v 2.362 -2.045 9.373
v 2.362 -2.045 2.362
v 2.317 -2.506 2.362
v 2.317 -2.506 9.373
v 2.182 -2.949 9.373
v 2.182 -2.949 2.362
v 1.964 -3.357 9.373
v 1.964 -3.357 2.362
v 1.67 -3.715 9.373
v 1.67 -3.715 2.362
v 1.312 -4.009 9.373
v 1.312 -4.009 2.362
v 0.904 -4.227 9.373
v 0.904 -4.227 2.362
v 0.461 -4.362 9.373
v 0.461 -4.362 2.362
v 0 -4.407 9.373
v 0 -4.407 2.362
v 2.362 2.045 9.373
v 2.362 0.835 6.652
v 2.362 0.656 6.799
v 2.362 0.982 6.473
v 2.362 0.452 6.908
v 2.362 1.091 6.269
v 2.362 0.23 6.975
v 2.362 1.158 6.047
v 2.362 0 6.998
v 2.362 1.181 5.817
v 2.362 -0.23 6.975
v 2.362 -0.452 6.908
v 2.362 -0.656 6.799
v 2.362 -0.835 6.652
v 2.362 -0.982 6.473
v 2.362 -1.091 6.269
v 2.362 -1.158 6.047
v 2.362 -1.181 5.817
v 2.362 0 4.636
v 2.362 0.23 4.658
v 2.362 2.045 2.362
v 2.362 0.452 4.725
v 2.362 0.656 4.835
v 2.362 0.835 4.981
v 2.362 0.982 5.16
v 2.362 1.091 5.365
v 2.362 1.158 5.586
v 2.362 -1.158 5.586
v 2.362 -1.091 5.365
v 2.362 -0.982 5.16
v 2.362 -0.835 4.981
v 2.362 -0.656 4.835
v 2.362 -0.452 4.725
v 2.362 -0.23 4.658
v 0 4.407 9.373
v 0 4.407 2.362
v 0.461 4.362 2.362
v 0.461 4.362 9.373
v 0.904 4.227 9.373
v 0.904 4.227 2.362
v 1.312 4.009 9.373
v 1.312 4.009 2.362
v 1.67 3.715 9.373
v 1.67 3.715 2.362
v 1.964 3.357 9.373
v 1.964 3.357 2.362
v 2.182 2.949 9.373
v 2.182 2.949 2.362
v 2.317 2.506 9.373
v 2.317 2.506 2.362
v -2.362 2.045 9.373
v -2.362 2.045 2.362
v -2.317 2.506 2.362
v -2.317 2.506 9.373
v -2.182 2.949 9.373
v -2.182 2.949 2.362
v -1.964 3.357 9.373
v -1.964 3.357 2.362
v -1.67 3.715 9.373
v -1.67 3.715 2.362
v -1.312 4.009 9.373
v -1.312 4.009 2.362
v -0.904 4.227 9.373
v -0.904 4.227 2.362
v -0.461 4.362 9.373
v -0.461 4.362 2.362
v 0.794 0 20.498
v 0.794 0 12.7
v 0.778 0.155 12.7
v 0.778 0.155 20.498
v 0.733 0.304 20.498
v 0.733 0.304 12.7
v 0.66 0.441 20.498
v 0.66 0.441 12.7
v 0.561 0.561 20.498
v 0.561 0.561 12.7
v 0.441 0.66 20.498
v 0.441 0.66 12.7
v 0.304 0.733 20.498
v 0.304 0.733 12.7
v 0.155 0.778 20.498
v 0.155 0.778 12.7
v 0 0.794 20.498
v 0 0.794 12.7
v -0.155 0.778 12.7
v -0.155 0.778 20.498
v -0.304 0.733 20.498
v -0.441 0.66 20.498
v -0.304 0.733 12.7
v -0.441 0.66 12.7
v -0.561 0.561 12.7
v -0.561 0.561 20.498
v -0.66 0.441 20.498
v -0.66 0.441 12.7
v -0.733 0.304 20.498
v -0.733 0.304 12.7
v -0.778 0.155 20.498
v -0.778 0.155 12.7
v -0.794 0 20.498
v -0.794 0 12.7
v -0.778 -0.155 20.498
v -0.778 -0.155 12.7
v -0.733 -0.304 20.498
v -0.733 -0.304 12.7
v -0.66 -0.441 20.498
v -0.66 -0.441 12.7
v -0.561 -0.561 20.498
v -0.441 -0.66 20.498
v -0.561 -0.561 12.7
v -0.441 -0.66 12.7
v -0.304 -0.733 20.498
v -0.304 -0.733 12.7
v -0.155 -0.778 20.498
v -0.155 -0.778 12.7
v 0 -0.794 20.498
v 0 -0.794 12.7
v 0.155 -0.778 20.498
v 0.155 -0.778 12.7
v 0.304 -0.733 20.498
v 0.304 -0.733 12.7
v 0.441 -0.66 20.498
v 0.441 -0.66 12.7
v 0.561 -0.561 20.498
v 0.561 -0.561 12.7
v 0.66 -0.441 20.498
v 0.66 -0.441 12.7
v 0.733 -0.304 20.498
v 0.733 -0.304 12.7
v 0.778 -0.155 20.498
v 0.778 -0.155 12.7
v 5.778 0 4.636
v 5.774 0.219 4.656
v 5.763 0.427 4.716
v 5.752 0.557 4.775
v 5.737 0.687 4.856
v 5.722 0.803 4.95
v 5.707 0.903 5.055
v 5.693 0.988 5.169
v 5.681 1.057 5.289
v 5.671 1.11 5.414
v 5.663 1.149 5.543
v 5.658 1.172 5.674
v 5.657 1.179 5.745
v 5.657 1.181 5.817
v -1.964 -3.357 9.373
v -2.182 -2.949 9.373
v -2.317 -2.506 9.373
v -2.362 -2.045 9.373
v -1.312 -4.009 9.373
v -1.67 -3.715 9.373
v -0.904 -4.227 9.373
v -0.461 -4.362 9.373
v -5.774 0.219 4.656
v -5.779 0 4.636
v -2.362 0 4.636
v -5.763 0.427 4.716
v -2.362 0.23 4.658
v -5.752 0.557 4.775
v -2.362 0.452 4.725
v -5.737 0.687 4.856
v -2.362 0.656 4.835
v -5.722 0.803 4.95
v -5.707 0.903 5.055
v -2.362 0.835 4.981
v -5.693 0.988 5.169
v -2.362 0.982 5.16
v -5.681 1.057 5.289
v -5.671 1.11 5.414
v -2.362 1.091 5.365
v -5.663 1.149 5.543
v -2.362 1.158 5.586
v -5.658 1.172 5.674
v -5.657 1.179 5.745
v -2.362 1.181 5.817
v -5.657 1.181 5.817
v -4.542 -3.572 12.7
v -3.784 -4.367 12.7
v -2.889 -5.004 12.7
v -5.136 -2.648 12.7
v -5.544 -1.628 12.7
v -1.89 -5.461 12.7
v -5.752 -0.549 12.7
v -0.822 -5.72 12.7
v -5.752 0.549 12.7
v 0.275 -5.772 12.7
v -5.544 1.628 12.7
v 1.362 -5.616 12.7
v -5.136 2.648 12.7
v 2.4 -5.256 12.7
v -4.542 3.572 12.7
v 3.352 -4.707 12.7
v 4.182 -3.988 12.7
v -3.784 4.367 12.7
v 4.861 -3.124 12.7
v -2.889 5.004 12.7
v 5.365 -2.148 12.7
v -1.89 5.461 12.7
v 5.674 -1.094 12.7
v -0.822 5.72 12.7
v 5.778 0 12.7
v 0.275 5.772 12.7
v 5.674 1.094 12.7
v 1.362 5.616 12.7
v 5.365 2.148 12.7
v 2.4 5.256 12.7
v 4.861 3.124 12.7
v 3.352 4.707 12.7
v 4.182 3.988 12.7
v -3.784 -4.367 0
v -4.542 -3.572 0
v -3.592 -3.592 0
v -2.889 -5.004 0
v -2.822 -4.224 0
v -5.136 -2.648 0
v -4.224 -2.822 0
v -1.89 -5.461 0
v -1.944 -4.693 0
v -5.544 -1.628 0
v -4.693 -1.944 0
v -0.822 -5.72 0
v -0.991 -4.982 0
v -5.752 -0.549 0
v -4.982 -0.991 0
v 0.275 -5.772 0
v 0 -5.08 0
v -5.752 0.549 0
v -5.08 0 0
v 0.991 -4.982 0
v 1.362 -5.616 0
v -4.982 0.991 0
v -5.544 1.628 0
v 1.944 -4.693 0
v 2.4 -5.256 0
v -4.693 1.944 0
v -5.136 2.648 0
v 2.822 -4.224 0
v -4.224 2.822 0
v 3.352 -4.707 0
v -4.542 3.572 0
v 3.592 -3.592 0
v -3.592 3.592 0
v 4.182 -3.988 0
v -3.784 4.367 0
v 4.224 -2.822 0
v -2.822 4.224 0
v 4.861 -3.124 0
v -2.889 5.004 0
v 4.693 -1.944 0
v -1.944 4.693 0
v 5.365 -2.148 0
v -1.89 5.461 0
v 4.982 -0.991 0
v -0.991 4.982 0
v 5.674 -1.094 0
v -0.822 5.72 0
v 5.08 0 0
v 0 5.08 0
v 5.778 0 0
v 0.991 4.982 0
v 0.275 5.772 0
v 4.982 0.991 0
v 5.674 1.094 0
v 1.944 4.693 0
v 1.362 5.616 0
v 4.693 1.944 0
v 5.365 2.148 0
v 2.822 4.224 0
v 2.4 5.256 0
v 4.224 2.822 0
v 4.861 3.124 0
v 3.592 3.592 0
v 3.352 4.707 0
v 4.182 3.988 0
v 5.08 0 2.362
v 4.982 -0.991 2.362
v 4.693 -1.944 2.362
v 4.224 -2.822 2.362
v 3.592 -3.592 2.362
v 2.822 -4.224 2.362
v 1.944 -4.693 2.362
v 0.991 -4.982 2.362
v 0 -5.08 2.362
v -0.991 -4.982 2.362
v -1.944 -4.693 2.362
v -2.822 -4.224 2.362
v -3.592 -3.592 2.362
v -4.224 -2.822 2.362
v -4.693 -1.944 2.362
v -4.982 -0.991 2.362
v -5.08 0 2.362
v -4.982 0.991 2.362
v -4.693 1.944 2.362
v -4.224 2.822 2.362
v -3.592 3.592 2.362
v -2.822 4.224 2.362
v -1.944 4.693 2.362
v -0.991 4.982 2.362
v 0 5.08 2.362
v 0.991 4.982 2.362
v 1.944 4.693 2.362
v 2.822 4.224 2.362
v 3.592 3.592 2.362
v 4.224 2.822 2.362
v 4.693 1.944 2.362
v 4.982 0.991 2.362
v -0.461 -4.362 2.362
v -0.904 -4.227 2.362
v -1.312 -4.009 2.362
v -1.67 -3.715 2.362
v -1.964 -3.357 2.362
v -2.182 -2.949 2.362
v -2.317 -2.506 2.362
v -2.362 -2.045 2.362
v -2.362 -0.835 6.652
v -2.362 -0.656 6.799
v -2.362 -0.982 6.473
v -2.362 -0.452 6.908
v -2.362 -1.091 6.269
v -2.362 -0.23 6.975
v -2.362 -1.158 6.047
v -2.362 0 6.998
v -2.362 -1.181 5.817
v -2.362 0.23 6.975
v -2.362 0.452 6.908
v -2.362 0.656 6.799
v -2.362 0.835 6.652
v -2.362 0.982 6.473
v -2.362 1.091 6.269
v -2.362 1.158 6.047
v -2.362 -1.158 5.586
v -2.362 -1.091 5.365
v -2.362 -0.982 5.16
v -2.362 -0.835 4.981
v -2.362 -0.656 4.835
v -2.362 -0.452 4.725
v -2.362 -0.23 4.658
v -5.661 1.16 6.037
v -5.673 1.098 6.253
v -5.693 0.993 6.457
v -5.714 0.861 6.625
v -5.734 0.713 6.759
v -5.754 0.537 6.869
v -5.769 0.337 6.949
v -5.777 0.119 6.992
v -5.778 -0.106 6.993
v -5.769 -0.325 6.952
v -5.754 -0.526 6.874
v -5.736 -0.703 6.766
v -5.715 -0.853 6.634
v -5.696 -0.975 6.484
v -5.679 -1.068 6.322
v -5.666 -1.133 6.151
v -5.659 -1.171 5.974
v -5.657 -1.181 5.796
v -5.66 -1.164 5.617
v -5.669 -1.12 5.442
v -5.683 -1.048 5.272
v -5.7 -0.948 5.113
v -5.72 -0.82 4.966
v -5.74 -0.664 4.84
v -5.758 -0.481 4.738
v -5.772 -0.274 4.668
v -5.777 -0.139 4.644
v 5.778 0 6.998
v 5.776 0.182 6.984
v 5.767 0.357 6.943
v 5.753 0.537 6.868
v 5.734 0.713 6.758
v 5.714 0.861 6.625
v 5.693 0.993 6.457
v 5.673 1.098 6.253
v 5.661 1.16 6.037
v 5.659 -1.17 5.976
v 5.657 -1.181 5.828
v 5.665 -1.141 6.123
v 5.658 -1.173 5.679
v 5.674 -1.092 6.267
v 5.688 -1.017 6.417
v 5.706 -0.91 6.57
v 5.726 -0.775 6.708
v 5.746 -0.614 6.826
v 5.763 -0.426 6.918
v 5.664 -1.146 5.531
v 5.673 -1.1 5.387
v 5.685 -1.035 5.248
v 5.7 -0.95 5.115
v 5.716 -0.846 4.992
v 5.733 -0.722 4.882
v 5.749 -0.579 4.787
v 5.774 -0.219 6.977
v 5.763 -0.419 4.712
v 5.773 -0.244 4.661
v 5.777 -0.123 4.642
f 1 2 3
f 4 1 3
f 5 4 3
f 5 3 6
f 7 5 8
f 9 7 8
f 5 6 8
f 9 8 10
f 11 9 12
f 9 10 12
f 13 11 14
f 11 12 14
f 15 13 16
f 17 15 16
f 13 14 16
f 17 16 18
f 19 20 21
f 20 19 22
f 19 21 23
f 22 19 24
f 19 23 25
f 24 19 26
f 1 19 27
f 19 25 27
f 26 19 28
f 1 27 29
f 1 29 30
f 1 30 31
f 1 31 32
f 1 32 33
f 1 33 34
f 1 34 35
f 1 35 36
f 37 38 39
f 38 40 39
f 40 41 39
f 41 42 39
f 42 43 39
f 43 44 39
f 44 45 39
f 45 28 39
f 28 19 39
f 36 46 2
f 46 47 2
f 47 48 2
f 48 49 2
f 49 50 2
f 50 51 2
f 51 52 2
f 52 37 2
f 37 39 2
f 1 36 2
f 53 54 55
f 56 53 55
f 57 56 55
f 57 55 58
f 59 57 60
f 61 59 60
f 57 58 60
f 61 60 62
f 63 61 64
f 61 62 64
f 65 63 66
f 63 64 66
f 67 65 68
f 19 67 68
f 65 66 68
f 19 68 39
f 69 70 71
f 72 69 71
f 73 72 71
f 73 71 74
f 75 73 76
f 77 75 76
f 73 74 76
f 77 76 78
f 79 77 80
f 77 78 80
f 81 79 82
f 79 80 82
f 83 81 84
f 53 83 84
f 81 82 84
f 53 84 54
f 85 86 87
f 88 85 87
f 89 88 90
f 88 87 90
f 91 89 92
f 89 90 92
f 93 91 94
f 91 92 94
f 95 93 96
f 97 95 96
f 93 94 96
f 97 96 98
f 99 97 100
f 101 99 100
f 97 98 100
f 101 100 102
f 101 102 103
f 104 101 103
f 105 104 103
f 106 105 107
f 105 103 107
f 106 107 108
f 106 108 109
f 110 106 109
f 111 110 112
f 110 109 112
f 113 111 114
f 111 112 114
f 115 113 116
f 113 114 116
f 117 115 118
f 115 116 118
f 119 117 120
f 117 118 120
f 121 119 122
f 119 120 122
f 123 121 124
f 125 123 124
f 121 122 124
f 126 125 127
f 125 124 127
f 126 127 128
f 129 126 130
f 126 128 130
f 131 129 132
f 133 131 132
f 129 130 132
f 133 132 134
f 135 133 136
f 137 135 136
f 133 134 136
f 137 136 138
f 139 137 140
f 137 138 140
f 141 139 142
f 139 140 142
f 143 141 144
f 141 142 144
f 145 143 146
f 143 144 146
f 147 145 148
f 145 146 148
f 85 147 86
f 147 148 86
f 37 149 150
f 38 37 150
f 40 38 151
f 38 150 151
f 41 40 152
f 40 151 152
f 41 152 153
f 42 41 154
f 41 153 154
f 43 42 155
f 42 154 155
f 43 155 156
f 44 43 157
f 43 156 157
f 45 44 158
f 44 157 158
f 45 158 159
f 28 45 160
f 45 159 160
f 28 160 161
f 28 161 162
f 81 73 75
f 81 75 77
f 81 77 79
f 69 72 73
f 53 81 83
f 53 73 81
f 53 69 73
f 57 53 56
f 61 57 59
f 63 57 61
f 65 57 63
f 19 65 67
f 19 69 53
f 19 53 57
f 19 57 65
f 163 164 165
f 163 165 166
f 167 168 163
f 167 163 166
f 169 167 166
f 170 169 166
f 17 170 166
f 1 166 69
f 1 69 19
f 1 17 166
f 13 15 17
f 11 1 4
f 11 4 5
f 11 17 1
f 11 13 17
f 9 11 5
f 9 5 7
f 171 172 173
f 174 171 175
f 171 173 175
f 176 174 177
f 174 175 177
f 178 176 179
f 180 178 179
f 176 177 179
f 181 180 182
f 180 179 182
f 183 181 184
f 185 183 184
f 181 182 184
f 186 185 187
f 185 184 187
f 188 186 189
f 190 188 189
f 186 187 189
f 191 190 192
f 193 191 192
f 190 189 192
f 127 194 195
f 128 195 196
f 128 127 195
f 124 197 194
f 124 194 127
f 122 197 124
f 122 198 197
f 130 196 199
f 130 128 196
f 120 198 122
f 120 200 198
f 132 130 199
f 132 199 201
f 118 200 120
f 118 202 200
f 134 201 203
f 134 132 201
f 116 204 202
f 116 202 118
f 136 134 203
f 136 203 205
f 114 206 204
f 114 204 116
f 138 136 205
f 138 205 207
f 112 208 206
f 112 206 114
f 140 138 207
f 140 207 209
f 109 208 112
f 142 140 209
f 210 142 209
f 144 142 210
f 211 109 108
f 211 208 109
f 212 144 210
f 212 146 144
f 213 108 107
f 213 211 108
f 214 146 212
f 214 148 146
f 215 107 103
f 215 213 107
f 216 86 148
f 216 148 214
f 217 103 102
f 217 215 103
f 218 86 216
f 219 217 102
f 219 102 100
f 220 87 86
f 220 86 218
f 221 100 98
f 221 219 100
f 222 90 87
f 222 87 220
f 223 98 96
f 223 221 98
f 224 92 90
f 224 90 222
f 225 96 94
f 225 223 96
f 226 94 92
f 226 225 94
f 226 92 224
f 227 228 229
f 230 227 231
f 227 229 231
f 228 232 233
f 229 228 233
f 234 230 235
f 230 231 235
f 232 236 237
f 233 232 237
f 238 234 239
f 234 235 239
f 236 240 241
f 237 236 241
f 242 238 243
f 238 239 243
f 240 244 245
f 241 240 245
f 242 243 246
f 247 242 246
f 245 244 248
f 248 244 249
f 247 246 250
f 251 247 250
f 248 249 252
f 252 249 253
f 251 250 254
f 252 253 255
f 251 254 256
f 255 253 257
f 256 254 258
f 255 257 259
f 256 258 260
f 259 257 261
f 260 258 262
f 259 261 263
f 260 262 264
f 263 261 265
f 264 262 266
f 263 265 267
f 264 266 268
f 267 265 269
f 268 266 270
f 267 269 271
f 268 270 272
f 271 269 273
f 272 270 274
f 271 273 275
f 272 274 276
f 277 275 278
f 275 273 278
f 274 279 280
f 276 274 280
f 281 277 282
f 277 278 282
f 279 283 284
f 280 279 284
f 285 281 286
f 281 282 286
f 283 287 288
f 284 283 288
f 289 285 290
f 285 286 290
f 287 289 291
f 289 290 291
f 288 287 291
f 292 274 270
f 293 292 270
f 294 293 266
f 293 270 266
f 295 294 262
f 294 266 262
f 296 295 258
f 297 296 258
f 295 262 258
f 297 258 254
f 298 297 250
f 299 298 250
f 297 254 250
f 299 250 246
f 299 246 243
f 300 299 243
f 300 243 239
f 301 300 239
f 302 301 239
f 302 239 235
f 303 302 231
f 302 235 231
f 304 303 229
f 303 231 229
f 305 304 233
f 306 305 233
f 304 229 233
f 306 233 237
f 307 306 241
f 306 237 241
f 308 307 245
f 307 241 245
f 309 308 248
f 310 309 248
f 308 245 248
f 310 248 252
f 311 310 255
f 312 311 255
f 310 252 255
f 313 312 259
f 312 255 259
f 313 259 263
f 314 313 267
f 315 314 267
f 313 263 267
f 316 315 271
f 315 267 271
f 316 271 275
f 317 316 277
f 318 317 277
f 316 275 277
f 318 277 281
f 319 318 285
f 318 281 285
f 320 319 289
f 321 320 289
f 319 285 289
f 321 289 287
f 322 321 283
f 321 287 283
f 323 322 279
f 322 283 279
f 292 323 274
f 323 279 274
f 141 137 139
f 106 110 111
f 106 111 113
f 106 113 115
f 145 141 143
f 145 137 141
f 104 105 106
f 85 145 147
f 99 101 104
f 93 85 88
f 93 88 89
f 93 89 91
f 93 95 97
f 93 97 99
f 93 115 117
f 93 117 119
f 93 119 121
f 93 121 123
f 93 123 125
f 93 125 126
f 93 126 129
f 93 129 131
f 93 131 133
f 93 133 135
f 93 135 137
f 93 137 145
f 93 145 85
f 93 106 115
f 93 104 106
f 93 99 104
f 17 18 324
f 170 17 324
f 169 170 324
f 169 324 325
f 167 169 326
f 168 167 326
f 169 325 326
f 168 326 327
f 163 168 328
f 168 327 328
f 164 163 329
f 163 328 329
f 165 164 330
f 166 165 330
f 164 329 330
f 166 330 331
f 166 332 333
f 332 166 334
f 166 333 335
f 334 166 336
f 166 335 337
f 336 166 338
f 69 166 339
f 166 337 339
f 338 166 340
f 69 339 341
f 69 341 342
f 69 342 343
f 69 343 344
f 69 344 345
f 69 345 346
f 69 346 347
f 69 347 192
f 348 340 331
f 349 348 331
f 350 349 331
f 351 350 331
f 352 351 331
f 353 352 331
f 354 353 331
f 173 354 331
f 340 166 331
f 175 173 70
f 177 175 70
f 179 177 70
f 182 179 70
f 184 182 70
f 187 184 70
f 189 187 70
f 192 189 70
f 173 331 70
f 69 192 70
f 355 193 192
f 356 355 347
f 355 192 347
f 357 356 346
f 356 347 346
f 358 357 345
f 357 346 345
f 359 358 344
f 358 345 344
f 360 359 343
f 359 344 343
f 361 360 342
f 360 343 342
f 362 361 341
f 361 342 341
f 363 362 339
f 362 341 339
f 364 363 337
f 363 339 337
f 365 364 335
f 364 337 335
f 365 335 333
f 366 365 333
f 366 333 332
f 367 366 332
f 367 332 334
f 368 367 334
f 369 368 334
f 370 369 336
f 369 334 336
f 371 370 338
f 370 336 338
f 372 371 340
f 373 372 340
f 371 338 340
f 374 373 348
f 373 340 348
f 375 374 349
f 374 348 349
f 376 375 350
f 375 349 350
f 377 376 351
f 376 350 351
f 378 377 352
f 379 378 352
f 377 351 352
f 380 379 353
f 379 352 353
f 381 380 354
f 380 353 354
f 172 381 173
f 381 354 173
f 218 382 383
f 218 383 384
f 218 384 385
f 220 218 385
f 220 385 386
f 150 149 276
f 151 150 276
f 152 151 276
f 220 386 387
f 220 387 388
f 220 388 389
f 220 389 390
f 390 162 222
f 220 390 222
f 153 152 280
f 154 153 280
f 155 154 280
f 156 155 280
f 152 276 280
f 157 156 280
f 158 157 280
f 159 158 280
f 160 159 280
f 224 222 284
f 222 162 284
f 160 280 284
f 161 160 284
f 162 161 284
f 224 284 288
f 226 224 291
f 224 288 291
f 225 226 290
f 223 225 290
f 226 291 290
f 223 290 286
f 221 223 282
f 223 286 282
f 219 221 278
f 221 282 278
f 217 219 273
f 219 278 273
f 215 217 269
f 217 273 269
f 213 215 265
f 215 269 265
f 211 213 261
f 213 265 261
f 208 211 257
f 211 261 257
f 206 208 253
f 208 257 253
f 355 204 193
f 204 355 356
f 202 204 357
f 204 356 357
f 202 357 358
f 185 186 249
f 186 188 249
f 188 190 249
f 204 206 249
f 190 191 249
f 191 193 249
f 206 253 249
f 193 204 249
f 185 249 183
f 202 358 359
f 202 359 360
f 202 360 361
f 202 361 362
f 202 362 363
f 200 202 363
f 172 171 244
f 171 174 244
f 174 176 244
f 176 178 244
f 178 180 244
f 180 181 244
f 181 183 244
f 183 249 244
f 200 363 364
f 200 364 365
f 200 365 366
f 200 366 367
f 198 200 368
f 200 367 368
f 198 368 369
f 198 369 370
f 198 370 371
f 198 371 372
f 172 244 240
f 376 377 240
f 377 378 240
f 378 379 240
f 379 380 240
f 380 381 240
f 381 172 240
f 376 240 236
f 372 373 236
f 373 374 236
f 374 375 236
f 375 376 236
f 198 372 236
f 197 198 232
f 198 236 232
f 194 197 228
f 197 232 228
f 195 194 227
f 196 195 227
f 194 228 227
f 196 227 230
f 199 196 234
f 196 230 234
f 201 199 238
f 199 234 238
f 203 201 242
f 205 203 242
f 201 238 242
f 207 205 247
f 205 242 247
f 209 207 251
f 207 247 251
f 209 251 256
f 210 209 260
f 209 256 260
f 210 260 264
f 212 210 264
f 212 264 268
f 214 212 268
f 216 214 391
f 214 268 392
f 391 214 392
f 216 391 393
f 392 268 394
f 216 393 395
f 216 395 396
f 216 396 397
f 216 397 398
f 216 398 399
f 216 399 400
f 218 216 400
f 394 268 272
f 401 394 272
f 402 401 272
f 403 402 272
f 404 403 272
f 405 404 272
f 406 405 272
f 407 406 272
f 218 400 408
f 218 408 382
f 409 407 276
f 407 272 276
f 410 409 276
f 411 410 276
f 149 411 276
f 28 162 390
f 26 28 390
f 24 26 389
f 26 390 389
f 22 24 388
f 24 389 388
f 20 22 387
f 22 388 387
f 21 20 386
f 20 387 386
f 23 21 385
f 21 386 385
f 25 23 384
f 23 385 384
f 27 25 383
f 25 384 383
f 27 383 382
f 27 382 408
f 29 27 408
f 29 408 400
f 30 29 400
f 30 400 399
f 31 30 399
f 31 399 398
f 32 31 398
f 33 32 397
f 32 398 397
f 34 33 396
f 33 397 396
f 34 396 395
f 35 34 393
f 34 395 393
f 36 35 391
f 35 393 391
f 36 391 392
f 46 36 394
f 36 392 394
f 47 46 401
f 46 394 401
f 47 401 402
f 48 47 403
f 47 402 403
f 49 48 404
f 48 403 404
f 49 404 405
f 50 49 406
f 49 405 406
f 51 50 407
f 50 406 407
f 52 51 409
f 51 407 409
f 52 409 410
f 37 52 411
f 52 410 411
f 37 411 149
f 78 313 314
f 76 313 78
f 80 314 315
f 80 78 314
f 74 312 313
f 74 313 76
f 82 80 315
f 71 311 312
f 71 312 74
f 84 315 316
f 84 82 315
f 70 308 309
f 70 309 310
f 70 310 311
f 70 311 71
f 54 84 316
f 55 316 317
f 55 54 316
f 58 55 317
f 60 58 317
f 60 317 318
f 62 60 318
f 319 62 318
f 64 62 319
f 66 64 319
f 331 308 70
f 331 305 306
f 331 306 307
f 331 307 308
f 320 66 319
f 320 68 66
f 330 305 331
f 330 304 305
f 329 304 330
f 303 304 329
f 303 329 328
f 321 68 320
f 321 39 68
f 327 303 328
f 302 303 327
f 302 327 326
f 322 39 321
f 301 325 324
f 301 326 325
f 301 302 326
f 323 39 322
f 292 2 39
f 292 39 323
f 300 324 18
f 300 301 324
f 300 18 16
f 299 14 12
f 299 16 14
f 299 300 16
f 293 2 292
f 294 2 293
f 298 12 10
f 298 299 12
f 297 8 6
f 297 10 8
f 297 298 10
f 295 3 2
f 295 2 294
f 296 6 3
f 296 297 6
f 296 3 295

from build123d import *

# Parameters (mm, degrees)
F0_R     = 5.7785
F1_DEPTH = 12.7
F2_R     = 5.08
F3_DEPTH = 2.3622
F5_DEPTH = 7.0104
F7_DEPTH = 12.7
F8_R     = 0.79375
F9_DEPTH = 7.7978


with BuildPart() as f1:
    # F0 (on Top) → F1 (new body)
    with BuildSketch(Plane.XY):
        Circle(F0_R)
    extrude(amount=F1_DEPTH)

    # F2 (on face) → F3 (cut)
    with BuildSketch(Plane(origin=(0, 0, 0), x_dir=(1, 0, 0), z_dir=(0, 0, -1))):
        Circle(F2_R)
    extrude(amount=-F3_DEPTH, mode=Mode.SUBTRACT)

    # F4 (on face) → F5 (cut)
    with BuildSketch(Plane(origin=(0, 0, 2.3622), x_dir=(1, 0, 0), z_dir=(0, 0, -1))):
        with BuildLine():
            Line((2.3622, -2.0447), (2.3622, 2.0447))
            ThreePointArc((2.3622, 2.0447), (1.670328, 3.715028), (0, 4.4069))
            ThreePointArc((0, 4.4069), (-1.670328, 3.715028), (-2.3622, 2.0447))
            Line((-2.3622, 2.0447), (-2.3622, -2.0447))
            ThreePointArc((-2.3622, -2.0447), (-1.670328, -3.715028), (0, -4.4069))
            ThreePointArc((0, -4.4069), (1.670328, -3.715028), (2.3622, -2.0447))
        make_face()
    extrude(amount=-F5_DEPTH, mode=Mode.SUBTRACT)

    # F6 (on Right) → F7 (cut, symmetric)
    with BuildSketch(Plane.YZ):
        with BuildLine():
            ThreePointArc((0, 4.6355), (0.835164, 4.981436), (1.1811, 5.8166))
            ThreePointArc((1.1811, 5.8166), (-0.835164, 6.651764), (0, 4.6355))
        make_face()
    extrude(amount=F7_DEPTH, both=True, mode=Mode.SUBTRACT)

    # F8 (on face) → F9 (join)
    with BuildSketch(Plane.XY.offset(12.7)):
        Circle(F8_R)
    extrude(amount=F9_DEPTH)


solid = f1.part
